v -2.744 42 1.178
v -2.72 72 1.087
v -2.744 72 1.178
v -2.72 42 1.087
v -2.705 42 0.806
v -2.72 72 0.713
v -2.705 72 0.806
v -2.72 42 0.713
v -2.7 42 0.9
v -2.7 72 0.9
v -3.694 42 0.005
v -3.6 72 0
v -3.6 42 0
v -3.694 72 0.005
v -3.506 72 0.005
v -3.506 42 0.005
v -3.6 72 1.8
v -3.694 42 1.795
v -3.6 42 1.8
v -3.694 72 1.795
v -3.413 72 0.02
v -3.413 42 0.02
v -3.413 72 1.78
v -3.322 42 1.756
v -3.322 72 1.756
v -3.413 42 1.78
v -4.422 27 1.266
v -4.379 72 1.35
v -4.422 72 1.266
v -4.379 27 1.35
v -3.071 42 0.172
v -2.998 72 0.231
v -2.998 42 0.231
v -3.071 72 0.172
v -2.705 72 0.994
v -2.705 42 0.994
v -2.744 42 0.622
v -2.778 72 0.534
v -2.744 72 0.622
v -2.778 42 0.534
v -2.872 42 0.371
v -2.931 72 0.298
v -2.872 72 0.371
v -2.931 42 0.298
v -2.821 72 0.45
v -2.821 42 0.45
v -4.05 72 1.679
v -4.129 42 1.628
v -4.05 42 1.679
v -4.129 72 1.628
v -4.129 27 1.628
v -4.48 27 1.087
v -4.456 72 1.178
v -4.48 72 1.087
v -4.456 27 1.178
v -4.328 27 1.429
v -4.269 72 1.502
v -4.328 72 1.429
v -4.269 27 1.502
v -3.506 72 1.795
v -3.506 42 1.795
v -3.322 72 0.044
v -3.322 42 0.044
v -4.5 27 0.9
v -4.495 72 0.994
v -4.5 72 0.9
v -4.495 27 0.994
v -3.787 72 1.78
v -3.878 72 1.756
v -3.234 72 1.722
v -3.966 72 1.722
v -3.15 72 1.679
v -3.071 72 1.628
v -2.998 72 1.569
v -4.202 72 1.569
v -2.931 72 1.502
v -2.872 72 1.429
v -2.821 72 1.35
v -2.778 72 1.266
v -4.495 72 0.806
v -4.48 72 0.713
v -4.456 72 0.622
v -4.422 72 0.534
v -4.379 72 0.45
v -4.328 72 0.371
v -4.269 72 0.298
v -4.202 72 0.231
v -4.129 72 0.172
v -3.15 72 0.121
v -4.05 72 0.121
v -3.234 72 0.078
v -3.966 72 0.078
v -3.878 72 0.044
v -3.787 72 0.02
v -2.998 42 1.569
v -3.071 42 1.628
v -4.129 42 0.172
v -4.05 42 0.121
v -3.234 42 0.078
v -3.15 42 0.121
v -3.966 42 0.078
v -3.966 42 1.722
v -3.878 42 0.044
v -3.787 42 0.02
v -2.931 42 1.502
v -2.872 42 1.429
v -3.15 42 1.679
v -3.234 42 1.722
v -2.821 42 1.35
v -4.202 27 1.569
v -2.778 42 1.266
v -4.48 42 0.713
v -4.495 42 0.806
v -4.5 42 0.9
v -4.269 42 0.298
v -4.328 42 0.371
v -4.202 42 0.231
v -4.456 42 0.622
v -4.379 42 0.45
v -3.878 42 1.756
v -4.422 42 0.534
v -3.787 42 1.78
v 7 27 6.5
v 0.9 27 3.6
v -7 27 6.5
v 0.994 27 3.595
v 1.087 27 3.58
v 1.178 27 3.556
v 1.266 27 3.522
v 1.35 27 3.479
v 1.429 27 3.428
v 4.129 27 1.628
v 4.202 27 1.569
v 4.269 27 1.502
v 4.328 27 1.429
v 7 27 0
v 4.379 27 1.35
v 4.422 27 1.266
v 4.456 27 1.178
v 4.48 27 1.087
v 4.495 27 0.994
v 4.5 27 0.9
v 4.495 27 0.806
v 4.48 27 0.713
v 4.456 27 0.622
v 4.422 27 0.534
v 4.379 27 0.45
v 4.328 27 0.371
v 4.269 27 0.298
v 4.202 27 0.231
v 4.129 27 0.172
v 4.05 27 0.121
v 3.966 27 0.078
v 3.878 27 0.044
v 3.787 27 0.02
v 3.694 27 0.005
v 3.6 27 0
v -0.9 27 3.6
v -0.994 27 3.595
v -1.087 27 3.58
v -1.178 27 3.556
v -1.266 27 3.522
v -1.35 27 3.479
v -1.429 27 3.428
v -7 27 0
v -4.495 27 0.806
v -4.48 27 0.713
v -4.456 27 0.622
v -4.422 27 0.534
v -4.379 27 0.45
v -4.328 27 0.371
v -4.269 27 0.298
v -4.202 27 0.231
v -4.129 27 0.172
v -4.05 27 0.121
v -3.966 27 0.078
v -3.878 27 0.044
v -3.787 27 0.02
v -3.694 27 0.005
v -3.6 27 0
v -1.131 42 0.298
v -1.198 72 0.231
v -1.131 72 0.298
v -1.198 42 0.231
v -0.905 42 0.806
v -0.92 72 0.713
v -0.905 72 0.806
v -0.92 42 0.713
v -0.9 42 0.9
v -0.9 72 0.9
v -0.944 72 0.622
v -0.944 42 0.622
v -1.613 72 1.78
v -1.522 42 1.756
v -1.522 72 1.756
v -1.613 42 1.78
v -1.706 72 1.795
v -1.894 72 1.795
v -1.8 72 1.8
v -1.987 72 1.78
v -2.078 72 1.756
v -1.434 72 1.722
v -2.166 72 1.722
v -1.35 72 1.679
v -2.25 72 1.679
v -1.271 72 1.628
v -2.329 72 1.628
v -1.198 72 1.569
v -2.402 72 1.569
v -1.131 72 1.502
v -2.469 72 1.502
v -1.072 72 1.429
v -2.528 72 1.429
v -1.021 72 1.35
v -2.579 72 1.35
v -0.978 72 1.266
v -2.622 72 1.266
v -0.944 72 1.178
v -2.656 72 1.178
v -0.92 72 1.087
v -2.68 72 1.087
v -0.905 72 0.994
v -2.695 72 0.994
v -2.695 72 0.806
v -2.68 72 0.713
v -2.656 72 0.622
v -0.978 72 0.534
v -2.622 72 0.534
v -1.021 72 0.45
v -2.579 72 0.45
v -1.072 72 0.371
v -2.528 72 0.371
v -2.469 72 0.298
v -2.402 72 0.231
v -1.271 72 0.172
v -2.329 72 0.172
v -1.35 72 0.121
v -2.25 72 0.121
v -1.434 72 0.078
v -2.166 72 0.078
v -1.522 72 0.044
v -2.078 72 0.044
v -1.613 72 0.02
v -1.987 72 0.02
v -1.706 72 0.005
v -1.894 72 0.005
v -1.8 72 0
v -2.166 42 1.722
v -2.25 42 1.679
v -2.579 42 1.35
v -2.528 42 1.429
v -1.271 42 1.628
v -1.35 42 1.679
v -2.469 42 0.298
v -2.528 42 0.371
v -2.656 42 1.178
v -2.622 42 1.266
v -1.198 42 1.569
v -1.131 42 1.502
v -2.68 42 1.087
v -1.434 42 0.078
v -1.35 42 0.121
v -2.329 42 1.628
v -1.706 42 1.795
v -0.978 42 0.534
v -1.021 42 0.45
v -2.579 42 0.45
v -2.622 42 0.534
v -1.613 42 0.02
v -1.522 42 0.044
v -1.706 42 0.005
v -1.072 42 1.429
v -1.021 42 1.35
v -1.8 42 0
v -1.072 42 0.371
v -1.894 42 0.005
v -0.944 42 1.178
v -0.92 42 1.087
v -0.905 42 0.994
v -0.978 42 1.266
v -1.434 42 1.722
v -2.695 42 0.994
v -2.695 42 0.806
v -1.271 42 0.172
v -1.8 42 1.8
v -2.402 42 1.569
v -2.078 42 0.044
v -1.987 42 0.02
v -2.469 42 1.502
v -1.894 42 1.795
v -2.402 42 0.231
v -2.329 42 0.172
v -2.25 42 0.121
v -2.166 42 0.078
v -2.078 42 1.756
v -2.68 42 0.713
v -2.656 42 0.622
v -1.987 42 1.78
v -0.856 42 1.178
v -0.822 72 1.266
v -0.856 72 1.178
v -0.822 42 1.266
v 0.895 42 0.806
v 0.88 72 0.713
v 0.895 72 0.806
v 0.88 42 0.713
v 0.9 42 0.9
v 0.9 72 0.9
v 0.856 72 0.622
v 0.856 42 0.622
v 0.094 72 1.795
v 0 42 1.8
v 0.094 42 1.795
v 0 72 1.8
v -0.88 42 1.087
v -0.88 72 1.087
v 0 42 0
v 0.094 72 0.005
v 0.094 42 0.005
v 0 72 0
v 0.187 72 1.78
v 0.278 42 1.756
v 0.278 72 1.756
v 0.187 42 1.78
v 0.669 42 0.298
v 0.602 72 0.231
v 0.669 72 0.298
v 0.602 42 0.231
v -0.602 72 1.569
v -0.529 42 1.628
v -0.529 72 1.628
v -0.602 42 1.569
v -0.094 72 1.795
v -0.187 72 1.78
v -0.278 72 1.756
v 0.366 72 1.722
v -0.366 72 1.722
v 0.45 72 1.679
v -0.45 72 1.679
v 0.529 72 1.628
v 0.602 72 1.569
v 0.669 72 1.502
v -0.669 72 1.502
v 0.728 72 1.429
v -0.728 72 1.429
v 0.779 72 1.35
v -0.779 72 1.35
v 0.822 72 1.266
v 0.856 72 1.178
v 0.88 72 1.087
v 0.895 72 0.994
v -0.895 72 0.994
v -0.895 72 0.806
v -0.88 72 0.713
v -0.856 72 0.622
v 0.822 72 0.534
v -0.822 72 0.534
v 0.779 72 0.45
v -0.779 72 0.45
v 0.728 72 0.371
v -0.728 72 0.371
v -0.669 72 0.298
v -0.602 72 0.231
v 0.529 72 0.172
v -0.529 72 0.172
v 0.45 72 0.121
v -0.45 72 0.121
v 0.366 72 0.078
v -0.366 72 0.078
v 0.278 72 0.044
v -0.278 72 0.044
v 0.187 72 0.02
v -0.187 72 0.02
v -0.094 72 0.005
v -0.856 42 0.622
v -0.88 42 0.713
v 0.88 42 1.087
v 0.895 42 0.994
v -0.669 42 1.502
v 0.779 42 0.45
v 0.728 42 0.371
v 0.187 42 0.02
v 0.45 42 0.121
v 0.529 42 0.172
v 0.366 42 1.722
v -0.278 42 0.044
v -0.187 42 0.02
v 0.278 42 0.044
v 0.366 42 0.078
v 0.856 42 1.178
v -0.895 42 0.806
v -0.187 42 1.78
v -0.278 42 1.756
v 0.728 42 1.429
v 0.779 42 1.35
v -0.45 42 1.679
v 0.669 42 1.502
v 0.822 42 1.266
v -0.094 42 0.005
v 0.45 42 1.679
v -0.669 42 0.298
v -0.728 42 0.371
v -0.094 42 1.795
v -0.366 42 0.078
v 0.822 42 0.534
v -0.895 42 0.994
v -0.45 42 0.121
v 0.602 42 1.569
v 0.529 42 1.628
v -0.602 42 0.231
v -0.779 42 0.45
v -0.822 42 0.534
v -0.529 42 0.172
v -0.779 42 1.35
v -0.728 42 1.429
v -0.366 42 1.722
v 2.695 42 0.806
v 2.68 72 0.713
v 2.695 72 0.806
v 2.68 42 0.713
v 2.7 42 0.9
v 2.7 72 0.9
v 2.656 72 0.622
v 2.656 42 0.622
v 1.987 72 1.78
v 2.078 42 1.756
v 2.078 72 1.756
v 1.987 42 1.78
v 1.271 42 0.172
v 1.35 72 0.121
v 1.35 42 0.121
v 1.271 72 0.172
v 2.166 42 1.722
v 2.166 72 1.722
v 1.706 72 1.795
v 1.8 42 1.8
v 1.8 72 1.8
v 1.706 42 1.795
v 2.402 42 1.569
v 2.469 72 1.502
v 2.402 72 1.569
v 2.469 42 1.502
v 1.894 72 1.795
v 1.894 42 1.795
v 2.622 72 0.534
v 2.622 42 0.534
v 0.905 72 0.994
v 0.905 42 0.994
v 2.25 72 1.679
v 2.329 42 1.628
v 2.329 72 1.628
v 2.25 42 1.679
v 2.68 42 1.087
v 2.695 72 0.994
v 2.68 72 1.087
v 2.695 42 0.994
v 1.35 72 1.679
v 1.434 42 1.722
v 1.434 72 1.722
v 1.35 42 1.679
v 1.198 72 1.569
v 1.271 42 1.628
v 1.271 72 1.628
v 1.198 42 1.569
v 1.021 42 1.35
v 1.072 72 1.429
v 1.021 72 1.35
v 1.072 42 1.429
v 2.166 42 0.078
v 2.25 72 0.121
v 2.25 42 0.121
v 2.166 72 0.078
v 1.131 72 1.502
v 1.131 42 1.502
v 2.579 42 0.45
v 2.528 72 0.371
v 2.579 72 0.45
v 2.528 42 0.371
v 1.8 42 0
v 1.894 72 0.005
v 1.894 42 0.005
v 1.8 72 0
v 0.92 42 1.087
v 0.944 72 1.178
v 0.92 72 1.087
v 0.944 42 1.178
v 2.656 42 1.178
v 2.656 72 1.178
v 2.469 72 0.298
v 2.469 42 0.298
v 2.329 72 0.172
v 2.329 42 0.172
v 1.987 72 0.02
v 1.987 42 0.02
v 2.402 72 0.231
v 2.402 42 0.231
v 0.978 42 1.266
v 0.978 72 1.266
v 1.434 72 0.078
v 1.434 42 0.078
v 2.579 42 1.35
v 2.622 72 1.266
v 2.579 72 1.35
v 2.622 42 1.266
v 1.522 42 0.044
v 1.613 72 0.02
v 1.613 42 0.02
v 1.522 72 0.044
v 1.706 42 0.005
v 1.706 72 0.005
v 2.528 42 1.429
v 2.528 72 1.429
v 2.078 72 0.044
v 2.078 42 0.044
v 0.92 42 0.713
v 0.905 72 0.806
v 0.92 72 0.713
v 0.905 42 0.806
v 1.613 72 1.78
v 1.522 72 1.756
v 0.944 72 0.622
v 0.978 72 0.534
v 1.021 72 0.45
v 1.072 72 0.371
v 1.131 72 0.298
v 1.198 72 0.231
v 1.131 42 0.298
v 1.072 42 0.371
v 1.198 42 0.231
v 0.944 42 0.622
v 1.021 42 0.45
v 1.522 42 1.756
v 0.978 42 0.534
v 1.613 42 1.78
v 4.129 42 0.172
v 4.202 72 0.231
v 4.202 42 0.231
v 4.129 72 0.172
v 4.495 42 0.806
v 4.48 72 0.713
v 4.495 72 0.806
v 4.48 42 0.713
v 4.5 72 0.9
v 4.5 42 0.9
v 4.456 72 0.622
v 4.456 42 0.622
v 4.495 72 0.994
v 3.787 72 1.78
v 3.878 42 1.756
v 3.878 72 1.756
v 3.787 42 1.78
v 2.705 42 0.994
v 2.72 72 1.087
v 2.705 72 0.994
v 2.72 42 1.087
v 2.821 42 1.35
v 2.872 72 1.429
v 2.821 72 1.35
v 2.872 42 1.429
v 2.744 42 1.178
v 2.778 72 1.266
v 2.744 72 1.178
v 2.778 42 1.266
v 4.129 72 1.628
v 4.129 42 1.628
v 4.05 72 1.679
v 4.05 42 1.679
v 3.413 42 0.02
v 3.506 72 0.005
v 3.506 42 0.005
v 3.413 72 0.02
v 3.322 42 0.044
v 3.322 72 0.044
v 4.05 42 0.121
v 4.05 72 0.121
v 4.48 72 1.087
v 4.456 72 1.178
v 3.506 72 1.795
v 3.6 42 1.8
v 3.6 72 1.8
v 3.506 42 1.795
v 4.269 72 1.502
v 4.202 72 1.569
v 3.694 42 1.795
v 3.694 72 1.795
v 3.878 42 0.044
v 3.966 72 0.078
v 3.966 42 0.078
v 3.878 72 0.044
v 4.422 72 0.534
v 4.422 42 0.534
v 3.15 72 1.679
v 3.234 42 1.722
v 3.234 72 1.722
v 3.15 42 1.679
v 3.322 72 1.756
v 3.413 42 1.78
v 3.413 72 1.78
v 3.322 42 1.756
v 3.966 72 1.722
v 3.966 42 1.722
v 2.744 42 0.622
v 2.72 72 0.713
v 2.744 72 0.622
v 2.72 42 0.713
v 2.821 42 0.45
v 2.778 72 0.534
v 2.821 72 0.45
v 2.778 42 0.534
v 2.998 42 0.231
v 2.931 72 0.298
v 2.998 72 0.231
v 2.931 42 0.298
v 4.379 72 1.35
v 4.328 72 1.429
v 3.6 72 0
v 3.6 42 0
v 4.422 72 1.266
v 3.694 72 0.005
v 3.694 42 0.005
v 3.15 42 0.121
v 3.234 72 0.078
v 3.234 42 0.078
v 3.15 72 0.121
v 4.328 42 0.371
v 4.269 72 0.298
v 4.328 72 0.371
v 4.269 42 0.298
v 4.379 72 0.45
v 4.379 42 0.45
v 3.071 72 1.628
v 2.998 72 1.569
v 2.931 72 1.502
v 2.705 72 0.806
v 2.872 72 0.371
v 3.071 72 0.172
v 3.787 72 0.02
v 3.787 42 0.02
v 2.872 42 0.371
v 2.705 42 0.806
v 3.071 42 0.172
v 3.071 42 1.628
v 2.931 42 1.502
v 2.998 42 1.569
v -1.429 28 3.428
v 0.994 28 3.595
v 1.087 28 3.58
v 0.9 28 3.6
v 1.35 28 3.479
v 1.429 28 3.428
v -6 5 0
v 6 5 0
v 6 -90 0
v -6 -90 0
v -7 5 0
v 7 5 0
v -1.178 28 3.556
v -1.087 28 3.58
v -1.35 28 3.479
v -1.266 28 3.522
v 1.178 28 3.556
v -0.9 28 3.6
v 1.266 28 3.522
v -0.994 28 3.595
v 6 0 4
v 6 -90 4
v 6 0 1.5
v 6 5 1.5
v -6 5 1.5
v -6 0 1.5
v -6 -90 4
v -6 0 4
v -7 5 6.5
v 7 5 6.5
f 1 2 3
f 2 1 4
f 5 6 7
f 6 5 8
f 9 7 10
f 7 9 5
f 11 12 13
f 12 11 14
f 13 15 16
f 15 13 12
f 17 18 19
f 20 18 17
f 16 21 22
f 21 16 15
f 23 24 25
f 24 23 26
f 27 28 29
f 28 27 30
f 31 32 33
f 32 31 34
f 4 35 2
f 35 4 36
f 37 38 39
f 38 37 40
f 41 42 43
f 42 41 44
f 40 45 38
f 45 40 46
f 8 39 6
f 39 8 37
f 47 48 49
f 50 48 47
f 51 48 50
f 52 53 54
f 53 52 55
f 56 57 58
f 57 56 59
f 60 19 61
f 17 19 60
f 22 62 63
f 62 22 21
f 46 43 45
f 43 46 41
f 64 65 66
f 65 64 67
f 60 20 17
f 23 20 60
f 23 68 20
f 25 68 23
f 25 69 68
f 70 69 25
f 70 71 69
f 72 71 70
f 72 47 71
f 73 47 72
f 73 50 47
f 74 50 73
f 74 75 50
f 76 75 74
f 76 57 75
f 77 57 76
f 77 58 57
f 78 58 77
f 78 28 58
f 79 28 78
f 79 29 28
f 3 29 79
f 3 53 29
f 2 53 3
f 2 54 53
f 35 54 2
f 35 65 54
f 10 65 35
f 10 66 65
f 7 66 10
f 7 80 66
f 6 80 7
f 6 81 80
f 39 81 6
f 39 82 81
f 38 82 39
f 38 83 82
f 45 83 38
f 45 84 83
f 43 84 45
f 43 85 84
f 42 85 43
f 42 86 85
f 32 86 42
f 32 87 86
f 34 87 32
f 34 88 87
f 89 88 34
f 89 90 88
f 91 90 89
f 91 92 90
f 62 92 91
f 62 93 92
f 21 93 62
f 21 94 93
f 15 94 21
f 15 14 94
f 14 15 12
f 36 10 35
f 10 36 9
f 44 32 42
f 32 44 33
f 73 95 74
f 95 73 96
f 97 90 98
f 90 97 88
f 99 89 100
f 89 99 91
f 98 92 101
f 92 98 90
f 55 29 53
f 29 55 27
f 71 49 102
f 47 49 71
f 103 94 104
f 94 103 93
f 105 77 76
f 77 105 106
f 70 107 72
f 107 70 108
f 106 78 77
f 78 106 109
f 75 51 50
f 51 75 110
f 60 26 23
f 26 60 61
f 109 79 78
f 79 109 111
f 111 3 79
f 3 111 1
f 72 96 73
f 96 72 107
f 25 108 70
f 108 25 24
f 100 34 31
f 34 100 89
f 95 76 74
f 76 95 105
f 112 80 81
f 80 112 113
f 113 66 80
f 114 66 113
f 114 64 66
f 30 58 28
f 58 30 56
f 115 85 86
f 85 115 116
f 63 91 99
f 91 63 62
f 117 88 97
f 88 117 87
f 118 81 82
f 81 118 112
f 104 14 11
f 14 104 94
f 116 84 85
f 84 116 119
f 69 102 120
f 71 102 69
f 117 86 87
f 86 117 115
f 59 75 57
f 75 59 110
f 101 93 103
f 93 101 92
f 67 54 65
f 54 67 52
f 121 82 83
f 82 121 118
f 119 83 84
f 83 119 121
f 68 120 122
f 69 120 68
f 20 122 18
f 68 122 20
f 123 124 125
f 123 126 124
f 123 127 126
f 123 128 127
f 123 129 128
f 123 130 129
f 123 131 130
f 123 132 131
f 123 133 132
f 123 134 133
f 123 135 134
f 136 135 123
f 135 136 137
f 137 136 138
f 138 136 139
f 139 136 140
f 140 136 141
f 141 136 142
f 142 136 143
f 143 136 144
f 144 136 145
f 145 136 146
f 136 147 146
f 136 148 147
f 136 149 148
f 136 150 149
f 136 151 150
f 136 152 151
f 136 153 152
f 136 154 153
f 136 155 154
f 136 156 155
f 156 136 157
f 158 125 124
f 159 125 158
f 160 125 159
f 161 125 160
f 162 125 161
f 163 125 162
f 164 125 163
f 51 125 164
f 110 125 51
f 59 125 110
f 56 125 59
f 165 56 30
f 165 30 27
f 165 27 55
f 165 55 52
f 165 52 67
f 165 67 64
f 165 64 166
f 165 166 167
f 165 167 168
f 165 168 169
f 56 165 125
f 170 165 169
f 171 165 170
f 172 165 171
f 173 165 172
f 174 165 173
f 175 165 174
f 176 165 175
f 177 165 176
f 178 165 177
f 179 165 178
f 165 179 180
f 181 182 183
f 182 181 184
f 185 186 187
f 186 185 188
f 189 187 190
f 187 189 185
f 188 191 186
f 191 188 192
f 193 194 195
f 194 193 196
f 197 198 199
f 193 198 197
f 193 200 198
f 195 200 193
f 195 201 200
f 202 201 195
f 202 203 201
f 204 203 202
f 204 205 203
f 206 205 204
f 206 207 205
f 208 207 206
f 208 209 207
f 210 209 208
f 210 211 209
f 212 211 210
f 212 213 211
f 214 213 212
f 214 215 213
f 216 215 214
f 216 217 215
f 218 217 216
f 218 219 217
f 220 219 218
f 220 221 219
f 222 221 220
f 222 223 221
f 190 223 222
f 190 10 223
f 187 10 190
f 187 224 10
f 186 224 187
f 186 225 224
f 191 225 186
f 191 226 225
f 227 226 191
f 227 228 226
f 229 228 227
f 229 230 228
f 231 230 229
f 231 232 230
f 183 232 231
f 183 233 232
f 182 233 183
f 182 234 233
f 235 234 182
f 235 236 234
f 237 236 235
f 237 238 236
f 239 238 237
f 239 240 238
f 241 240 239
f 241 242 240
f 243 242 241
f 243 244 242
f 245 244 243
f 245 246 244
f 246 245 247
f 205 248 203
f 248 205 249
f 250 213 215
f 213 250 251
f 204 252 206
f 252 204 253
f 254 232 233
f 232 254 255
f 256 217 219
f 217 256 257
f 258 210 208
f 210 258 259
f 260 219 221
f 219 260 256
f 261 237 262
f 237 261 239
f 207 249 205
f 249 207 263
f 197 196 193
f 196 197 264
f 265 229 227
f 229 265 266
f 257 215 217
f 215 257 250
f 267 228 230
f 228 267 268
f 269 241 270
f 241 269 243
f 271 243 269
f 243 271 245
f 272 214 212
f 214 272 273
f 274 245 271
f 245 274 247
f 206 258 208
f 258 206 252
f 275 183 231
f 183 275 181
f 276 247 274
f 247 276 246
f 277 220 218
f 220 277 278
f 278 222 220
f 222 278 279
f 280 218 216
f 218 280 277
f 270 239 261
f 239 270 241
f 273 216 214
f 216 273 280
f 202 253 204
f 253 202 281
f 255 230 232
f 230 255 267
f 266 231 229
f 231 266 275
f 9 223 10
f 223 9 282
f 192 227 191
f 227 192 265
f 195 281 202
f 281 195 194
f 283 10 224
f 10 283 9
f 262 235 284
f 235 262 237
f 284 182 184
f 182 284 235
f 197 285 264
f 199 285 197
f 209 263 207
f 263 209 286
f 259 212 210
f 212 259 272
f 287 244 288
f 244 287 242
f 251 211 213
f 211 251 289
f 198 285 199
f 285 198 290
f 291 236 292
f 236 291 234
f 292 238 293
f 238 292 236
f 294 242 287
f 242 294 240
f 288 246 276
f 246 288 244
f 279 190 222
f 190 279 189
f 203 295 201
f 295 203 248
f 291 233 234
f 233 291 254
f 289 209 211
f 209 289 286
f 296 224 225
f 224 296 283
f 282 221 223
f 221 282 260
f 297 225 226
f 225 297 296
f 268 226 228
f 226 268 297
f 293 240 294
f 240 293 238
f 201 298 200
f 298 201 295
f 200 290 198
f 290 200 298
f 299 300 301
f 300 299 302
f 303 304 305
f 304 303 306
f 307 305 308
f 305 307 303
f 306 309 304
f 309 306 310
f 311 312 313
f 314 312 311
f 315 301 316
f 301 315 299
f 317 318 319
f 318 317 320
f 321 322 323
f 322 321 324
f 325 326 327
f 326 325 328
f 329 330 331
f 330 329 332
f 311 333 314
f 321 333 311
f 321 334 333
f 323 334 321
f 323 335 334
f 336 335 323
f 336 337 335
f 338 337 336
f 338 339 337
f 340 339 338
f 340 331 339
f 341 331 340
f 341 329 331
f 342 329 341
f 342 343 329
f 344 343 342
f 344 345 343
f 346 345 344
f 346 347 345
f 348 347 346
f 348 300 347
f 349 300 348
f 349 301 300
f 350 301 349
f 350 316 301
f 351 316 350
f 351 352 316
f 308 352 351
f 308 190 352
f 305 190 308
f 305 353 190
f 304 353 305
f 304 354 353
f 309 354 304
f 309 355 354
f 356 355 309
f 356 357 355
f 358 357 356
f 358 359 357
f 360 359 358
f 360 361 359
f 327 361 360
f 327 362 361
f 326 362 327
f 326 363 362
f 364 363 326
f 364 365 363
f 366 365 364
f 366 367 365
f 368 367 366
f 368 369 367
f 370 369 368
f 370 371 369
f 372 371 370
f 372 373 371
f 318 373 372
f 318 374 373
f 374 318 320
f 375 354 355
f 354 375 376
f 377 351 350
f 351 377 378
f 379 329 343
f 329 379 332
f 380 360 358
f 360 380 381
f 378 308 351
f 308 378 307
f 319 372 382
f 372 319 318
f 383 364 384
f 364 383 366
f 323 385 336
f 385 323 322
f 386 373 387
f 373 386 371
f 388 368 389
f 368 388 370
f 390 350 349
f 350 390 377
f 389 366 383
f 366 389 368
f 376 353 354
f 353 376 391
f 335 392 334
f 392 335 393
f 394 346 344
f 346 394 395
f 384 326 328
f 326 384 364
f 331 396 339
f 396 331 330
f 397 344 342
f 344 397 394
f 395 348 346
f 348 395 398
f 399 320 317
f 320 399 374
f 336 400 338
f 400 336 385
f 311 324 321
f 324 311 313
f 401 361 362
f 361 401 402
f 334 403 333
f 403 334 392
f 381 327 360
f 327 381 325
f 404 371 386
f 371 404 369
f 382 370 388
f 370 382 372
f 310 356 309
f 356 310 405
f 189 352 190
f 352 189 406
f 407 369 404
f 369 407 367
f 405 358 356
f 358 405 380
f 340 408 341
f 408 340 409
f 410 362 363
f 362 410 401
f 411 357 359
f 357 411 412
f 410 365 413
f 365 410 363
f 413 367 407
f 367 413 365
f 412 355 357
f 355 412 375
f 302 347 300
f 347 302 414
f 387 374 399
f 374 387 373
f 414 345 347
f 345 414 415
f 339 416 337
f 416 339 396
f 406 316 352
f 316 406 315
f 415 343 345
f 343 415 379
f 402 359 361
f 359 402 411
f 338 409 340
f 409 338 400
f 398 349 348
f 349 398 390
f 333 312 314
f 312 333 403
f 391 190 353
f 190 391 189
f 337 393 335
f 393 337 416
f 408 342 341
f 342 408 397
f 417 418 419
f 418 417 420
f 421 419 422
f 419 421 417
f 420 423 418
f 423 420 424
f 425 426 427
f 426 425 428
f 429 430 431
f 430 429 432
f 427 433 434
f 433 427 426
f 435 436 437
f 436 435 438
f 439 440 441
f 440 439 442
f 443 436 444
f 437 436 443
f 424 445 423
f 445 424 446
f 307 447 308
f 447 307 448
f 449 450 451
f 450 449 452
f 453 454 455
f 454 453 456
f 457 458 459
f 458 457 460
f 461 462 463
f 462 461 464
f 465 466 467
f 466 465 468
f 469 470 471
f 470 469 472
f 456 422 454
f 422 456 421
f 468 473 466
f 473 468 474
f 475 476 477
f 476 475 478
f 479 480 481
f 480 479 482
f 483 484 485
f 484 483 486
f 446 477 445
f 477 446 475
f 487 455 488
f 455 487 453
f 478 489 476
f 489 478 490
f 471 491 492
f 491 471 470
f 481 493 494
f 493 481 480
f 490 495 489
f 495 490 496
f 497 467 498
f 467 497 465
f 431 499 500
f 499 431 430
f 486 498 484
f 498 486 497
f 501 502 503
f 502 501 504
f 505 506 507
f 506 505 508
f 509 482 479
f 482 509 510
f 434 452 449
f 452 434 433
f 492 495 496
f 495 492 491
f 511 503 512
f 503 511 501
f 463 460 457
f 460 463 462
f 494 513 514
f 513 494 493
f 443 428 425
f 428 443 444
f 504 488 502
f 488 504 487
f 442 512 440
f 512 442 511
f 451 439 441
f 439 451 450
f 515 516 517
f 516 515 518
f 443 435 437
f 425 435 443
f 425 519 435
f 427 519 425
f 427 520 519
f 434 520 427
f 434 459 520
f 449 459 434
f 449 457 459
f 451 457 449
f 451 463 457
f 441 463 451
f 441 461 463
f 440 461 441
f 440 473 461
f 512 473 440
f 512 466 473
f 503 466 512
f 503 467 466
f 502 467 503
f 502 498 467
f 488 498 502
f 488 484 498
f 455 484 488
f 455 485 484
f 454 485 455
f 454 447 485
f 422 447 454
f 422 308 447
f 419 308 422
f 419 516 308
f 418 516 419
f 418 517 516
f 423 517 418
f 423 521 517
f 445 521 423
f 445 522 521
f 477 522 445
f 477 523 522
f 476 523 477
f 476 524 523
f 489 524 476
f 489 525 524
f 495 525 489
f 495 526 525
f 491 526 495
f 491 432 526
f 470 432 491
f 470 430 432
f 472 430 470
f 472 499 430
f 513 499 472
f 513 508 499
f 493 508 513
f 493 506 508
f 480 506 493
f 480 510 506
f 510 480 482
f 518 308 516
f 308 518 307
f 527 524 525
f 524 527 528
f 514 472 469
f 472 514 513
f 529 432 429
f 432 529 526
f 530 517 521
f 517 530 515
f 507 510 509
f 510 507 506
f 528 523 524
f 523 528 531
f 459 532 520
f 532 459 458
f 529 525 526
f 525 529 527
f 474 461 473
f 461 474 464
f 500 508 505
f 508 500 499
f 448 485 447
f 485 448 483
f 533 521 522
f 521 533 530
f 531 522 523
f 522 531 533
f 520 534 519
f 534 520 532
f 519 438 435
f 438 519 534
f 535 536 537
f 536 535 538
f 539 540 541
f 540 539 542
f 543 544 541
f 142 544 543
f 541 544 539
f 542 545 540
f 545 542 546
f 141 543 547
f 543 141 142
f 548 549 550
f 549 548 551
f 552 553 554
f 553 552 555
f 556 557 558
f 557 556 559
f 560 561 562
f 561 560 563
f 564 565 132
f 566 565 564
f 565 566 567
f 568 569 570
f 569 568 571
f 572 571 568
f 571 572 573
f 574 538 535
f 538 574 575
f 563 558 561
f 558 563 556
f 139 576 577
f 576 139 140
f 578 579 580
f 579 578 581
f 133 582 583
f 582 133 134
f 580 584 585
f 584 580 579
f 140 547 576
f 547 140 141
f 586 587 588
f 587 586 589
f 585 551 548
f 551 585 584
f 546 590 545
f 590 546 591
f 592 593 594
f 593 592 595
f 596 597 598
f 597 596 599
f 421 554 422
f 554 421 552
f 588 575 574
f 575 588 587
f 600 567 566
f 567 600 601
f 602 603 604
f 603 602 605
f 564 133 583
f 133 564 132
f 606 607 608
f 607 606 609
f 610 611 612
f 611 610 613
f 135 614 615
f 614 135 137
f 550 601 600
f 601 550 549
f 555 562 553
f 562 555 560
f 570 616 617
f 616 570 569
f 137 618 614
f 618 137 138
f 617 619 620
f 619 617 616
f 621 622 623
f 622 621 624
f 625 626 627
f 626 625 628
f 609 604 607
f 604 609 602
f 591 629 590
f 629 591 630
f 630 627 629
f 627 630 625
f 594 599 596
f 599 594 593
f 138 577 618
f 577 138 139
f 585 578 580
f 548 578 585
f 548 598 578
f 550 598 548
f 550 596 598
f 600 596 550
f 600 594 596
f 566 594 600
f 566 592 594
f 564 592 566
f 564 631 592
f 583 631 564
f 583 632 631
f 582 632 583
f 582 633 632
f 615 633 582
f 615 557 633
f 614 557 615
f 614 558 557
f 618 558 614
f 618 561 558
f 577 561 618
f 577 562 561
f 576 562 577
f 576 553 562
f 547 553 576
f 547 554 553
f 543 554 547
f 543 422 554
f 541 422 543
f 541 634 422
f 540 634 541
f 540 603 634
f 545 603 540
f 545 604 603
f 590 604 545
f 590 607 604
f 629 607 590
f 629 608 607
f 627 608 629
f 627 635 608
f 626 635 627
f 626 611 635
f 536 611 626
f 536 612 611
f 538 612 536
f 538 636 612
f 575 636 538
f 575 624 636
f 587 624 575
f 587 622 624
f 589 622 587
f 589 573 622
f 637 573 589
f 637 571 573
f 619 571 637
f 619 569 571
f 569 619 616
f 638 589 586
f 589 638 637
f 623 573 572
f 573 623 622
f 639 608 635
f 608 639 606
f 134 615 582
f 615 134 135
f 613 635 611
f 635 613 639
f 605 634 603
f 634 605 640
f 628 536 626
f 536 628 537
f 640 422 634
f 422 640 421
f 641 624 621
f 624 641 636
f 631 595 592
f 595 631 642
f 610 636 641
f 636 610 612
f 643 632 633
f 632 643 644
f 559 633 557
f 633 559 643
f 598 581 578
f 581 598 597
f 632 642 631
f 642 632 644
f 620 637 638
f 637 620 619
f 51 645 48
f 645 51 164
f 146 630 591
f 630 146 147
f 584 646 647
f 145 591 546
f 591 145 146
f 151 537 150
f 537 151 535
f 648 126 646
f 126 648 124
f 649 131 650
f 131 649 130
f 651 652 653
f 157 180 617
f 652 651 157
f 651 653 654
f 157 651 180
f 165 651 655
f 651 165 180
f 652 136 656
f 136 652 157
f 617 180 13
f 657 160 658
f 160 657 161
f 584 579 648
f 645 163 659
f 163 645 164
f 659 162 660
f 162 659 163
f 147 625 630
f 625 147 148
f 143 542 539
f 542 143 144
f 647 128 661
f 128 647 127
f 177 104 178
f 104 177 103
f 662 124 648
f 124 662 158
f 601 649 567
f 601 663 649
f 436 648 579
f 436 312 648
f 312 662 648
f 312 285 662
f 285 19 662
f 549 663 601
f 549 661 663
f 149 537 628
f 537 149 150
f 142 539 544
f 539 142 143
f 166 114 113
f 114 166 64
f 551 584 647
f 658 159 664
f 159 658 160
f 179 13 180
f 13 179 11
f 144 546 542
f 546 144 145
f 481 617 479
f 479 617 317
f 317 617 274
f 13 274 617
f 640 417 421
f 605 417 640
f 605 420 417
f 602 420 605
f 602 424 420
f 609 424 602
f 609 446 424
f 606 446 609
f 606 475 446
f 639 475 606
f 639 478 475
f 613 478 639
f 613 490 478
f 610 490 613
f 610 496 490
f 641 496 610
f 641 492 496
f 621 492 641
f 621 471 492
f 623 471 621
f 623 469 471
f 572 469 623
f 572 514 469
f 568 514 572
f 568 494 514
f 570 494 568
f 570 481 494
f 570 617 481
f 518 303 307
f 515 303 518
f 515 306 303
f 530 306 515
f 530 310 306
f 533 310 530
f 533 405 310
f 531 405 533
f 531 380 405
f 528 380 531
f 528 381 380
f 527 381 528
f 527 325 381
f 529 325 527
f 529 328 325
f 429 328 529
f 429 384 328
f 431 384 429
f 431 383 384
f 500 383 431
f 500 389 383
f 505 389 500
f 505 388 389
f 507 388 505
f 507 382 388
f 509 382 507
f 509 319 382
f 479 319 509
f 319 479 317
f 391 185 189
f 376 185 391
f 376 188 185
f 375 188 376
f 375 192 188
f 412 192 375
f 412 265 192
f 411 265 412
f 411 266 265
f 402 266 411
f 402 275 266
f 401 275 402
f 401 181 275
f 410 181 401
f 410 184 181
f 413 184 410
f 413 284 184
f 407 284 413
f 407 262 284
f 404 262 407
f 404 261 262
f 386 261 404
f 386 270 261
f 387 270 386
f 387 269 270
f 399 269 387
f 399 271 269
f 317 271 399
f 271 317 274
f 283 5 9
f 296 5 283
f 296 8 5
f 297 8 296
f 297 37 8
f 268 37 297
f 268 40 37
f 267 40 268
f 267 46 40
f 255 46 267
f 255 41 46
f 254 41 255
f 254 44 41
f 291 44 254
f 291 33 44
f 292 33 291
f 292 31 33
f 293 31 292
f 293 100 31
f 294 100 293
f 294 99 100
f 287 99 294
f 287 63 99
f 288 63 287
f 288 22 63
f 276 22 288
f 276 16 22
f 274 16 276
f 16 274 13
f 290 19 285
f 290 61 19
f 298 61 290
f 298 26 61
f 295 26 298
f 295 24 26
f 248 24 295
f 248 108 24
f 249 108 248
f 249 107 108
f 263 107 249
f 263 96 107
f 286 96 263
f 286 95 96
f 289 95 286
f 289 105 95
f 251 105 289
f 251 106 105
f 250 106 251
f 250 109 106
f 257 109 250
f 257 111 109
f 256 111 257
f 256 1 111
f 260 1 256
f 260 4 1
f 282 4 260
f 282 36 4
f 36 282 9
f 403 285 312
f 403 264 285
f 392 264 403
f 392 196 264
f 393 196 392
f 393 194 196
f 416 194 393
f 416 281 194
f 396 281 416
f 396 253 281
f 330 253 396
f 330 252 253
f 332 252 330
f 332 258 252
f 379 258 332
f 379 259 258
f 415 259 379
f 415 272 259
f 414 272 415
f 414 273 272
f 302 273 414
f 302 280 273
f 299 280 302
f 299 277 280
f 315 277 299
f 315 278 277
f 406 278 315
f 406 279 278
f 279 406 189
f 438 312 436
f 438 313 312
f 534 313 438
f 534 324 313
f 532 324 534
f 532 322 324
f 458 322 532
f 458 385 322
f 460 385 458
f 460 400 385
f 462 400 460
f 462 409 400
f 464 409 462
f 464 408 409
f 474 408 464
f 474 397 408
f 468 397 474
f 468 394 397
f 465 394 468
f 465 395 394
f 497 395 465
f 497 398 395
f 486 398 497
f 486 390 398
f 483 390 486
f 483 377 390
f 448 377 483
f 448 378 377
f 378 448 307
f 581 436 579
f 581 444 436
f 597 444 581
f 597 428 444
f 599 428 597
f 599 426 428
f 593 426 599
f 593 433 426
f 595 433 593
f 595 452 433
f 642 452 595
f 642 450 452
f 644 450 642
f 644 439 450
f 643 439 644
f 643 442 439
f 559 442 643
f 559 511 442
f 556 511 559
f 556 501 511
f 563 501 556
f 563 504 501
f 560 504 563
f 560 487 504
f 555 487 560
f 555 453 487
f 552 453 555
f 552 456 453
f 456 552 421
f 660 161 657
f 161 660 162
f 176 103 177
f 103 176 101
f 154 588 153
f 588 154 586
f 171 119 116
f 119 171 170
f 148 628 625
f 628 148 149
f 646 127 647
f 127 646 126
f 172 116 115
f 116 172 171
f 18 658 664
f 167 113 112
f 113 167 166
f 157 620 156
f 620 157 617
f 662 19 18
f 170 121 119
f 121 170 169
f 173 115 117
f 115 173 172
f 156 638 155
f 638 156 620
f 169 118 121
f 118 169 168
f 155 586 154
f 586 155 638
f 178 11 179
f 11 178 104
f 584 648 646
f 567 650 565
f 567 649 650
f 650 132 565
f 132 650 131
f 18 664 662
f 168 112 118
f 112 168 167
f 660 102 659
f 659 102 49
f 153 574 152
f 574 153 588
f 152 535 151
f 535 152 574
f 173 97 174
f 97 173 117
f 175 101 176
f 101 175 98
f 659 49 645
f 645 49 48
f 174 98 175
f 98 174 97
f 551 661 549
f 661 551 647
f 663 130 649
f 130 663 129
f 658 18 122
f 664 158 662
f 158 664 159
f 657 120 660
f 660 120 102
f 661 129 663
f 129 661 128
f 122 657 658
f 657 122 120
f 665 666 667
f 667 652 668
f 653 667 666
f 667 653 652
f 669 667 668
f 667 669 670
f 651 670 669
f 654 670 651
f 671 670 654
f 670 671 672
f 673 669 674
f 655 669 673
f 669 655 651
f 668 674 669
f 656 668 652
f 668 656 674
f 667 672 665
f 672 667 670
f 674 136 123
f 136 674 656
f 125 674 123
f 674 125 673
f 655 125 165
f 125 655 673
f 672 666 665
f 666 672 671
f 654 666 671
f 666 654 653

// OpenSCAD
// file: dimensions.scad
$fn = 60;

// led strip

led_strip_width         = 12.0;  // mm
led_strip_height        =  4.0;  // mm

led_strip_clutch_length =  5.0;  // mm
led_strip_clutch_height =  1.5;  // mm

led_strip_end_length    = 22.0;  // mm
led_strip_end_width     = 14.0;  // mm
led_strip_end_height    =  6.5;  // mm

led_wire_diameter       =  1.8;  // mm
led_wire_length         = 90.0;   // mm
led_wire_sort_distance  = 15.0;   // mm

led_wire_clutch_width   =  9.0;  // mm
led_wire_clutch_length  = 15.0;  // mm
led_wire_clutch_height  = led_wire_diameter;  // mm

led_length_requirements = (
      led_strip_clutch_length  // led clutch area
    + led_strip_end_length     // led end cap
    + led_wire_sort_distance   // sorting the wires to a ribbon cable
    + led_wire_sort_distance   // clamping the wires down
    + led_wire_sort_distance   // bending the wires around
);

// cases

case_wall      =  2.0; // mm
case_plate     =  2.0; // mm
case_z_radius  =  1.0; // mm, horizontal edge radius


// screws - M3 machine screws, roughly measured

screw_shaft_diameter   = 3.0; // mm
screw_head_diameter    = 5.5; // mm
screw_head_height      = 3.0; // mm
screw_shaft_max_length = 20; // mm

screw_nut_diameter   = 6.0; // mm
screw_nut_height     = 2.2; // mm

screw_hole_slack     = 0.2 * 2; // mm


screw_pillar_diameter = screw_nut_diameter +  2 * case_wall;
screw_pillar_radius   = screw_pillar_diameter / 2;
screw_shaft_radius    = screw_shaft_diameter / 2;



// hook case

// the z height depends also on the screw length, check comment
hook_case_outer = [
    led_strip_end_width + 2 * screw_pillar_diameter,
    led_length_requirements + case_wall,            // only one, the second is used to clutch the led strip
    (
        10.0                                        // mm inner height needed for bending the cables
      + case_plate * 2                              // top and bottom plate
      +  1.0                                        // to get to (10 + 2*2 + 1) = 15 - screw_head_height = 12 mm screws
    )
];

hook_case_inner = hook_case_outer - 2 * [case_wall, case_wall, case_plate];
hook_case_pillar_center = hook_case_outer - [screw_pillar_diameter, screw_pillar_diameter, screw_pillar_diameter];


// the wire clutch for a case

wire_clutch_clamp_block_width  =  5.0; // mm
wire_clutch_clamp_slide_length =  5.0; // mm
wire_clutch_assembly_offset    = led_length_requirements - 2 * led_wire_sort_distance;


// usb-c connector cutout
usb_c_connector = [13.5, 9.0, 5.3]; // mmm


// esp32
esp32_plate  = [18.0, 20.8, 1.6]; // from the adafruit website
esp32_offset = [11.0,  0.8, 0.0]; // moving the model to [0,0,0]

esp32_clearance_usb   = 1.2;      // mm, the usb-c part sticks out of the plate
esp32_clearance_upper = 3.5;      // mm, leave at least this much space above the plate
esp32_clearance_lower = 1.5;      // mm, leave at least this much space below the plate

esp32_usbc_width      = esp32_plate.x - (4.5 * 2); // roughly from the website



module rounded_edge(length=20, radius=5, slack=0.25) {
    offset_vector = [radius, radius, length] / 2;
    translate(-offset_vector)
        difference() {
            cube([radius + slack, radius + slack, length]);
            translate([0, 0, -1])
                cylinder(length + 2, r=radius);
        }
}


module esp32_model() {
    translate(esp32_offset)
            import("5426 QT Py ESP32-S3.stl");
}
// main file
include<dimensions.scad>;


module led_strip_clutch_zone(slack=0) {
    translate([-led_strip_width / 2, -slack, 0])
        cube([led_strip_width,  led_strip_clutch_length + 2 * slack, led_strip_clutch_height + slack]);
}


module strip_clutch(slack=0) {
    strip_clutch_pressing = led_strip_height - led_strip_clutch_height;

    /*
    translate([-led_strip_width / 2, -slack / 2, led_strip_clutch_height])
        cube([led_strip_width, led_strip_clutch_length + slack, strip_clutch_pressing]);
    */
    translate([(led_strip_width + case_wall) / 2, -slack/2, led_strip_clutch_height])
        rotate([-90, 180, 0])
            linear_extrude(led_strip_clutch_length + slack)
                polygon([
                    [0, strip_clutch_pressing + 1],
                    [case_wall / 2, 0],
                    [led_strip_width + case_wall / 2, 0],
                    [led_strip_width + case_wall, strip_clutch_pressing + 1]
                ]);
}

module led_strip(length=led_wire_length) {

    wire_radius = led_wire_diameter / 2;

    module _ribbon_cable(length, number=5) {
        zero_index = number - 1;
        factors = [ for( i=[0:zero_index] ) i - zero_index / 2 ];

        translate([0, 0, wire_radius])
            rotate([-90, 0, 0])
                for(i=factors) {
                    dx = i * led_wire_diameter;
                    translate([dx, 0, 0])
                        cylinder(h=length, d=led_wire_diameter);
                }
    }

    module _led_strip_wires(length) {
        _ribbon_cable(length=length, number=5);
        hull() {
            translate([0, 0, led_wire_diameter])
                _ribbon_cable(length=1, number=2);
            _ribbon_cable(length=led_wire_sort_distance, number=5);
        }
    }

    // this is the anchor to build around
    // the clutch zone for the strip
    led_strip_clutch_zone();

    // the end cab of the strip
    translate([-led_strip_end_width / 2, led_strip_clutch_length, 0])
        cube([led_strip_end_width, led_strip_end_length, led_strip_end_height]);

    // the wires
    translate([0, led_strip_end_length + led_strip_clutch_length, 0])
        _led_strip_wires(length=length / 2);

    // the rest of the strip
    translate([-led_strip_width / 2, -length, 0])
        cube([led_strip_width, length, led_strip_height]);

}


color("LightBlue", 0.5) led_strip();
